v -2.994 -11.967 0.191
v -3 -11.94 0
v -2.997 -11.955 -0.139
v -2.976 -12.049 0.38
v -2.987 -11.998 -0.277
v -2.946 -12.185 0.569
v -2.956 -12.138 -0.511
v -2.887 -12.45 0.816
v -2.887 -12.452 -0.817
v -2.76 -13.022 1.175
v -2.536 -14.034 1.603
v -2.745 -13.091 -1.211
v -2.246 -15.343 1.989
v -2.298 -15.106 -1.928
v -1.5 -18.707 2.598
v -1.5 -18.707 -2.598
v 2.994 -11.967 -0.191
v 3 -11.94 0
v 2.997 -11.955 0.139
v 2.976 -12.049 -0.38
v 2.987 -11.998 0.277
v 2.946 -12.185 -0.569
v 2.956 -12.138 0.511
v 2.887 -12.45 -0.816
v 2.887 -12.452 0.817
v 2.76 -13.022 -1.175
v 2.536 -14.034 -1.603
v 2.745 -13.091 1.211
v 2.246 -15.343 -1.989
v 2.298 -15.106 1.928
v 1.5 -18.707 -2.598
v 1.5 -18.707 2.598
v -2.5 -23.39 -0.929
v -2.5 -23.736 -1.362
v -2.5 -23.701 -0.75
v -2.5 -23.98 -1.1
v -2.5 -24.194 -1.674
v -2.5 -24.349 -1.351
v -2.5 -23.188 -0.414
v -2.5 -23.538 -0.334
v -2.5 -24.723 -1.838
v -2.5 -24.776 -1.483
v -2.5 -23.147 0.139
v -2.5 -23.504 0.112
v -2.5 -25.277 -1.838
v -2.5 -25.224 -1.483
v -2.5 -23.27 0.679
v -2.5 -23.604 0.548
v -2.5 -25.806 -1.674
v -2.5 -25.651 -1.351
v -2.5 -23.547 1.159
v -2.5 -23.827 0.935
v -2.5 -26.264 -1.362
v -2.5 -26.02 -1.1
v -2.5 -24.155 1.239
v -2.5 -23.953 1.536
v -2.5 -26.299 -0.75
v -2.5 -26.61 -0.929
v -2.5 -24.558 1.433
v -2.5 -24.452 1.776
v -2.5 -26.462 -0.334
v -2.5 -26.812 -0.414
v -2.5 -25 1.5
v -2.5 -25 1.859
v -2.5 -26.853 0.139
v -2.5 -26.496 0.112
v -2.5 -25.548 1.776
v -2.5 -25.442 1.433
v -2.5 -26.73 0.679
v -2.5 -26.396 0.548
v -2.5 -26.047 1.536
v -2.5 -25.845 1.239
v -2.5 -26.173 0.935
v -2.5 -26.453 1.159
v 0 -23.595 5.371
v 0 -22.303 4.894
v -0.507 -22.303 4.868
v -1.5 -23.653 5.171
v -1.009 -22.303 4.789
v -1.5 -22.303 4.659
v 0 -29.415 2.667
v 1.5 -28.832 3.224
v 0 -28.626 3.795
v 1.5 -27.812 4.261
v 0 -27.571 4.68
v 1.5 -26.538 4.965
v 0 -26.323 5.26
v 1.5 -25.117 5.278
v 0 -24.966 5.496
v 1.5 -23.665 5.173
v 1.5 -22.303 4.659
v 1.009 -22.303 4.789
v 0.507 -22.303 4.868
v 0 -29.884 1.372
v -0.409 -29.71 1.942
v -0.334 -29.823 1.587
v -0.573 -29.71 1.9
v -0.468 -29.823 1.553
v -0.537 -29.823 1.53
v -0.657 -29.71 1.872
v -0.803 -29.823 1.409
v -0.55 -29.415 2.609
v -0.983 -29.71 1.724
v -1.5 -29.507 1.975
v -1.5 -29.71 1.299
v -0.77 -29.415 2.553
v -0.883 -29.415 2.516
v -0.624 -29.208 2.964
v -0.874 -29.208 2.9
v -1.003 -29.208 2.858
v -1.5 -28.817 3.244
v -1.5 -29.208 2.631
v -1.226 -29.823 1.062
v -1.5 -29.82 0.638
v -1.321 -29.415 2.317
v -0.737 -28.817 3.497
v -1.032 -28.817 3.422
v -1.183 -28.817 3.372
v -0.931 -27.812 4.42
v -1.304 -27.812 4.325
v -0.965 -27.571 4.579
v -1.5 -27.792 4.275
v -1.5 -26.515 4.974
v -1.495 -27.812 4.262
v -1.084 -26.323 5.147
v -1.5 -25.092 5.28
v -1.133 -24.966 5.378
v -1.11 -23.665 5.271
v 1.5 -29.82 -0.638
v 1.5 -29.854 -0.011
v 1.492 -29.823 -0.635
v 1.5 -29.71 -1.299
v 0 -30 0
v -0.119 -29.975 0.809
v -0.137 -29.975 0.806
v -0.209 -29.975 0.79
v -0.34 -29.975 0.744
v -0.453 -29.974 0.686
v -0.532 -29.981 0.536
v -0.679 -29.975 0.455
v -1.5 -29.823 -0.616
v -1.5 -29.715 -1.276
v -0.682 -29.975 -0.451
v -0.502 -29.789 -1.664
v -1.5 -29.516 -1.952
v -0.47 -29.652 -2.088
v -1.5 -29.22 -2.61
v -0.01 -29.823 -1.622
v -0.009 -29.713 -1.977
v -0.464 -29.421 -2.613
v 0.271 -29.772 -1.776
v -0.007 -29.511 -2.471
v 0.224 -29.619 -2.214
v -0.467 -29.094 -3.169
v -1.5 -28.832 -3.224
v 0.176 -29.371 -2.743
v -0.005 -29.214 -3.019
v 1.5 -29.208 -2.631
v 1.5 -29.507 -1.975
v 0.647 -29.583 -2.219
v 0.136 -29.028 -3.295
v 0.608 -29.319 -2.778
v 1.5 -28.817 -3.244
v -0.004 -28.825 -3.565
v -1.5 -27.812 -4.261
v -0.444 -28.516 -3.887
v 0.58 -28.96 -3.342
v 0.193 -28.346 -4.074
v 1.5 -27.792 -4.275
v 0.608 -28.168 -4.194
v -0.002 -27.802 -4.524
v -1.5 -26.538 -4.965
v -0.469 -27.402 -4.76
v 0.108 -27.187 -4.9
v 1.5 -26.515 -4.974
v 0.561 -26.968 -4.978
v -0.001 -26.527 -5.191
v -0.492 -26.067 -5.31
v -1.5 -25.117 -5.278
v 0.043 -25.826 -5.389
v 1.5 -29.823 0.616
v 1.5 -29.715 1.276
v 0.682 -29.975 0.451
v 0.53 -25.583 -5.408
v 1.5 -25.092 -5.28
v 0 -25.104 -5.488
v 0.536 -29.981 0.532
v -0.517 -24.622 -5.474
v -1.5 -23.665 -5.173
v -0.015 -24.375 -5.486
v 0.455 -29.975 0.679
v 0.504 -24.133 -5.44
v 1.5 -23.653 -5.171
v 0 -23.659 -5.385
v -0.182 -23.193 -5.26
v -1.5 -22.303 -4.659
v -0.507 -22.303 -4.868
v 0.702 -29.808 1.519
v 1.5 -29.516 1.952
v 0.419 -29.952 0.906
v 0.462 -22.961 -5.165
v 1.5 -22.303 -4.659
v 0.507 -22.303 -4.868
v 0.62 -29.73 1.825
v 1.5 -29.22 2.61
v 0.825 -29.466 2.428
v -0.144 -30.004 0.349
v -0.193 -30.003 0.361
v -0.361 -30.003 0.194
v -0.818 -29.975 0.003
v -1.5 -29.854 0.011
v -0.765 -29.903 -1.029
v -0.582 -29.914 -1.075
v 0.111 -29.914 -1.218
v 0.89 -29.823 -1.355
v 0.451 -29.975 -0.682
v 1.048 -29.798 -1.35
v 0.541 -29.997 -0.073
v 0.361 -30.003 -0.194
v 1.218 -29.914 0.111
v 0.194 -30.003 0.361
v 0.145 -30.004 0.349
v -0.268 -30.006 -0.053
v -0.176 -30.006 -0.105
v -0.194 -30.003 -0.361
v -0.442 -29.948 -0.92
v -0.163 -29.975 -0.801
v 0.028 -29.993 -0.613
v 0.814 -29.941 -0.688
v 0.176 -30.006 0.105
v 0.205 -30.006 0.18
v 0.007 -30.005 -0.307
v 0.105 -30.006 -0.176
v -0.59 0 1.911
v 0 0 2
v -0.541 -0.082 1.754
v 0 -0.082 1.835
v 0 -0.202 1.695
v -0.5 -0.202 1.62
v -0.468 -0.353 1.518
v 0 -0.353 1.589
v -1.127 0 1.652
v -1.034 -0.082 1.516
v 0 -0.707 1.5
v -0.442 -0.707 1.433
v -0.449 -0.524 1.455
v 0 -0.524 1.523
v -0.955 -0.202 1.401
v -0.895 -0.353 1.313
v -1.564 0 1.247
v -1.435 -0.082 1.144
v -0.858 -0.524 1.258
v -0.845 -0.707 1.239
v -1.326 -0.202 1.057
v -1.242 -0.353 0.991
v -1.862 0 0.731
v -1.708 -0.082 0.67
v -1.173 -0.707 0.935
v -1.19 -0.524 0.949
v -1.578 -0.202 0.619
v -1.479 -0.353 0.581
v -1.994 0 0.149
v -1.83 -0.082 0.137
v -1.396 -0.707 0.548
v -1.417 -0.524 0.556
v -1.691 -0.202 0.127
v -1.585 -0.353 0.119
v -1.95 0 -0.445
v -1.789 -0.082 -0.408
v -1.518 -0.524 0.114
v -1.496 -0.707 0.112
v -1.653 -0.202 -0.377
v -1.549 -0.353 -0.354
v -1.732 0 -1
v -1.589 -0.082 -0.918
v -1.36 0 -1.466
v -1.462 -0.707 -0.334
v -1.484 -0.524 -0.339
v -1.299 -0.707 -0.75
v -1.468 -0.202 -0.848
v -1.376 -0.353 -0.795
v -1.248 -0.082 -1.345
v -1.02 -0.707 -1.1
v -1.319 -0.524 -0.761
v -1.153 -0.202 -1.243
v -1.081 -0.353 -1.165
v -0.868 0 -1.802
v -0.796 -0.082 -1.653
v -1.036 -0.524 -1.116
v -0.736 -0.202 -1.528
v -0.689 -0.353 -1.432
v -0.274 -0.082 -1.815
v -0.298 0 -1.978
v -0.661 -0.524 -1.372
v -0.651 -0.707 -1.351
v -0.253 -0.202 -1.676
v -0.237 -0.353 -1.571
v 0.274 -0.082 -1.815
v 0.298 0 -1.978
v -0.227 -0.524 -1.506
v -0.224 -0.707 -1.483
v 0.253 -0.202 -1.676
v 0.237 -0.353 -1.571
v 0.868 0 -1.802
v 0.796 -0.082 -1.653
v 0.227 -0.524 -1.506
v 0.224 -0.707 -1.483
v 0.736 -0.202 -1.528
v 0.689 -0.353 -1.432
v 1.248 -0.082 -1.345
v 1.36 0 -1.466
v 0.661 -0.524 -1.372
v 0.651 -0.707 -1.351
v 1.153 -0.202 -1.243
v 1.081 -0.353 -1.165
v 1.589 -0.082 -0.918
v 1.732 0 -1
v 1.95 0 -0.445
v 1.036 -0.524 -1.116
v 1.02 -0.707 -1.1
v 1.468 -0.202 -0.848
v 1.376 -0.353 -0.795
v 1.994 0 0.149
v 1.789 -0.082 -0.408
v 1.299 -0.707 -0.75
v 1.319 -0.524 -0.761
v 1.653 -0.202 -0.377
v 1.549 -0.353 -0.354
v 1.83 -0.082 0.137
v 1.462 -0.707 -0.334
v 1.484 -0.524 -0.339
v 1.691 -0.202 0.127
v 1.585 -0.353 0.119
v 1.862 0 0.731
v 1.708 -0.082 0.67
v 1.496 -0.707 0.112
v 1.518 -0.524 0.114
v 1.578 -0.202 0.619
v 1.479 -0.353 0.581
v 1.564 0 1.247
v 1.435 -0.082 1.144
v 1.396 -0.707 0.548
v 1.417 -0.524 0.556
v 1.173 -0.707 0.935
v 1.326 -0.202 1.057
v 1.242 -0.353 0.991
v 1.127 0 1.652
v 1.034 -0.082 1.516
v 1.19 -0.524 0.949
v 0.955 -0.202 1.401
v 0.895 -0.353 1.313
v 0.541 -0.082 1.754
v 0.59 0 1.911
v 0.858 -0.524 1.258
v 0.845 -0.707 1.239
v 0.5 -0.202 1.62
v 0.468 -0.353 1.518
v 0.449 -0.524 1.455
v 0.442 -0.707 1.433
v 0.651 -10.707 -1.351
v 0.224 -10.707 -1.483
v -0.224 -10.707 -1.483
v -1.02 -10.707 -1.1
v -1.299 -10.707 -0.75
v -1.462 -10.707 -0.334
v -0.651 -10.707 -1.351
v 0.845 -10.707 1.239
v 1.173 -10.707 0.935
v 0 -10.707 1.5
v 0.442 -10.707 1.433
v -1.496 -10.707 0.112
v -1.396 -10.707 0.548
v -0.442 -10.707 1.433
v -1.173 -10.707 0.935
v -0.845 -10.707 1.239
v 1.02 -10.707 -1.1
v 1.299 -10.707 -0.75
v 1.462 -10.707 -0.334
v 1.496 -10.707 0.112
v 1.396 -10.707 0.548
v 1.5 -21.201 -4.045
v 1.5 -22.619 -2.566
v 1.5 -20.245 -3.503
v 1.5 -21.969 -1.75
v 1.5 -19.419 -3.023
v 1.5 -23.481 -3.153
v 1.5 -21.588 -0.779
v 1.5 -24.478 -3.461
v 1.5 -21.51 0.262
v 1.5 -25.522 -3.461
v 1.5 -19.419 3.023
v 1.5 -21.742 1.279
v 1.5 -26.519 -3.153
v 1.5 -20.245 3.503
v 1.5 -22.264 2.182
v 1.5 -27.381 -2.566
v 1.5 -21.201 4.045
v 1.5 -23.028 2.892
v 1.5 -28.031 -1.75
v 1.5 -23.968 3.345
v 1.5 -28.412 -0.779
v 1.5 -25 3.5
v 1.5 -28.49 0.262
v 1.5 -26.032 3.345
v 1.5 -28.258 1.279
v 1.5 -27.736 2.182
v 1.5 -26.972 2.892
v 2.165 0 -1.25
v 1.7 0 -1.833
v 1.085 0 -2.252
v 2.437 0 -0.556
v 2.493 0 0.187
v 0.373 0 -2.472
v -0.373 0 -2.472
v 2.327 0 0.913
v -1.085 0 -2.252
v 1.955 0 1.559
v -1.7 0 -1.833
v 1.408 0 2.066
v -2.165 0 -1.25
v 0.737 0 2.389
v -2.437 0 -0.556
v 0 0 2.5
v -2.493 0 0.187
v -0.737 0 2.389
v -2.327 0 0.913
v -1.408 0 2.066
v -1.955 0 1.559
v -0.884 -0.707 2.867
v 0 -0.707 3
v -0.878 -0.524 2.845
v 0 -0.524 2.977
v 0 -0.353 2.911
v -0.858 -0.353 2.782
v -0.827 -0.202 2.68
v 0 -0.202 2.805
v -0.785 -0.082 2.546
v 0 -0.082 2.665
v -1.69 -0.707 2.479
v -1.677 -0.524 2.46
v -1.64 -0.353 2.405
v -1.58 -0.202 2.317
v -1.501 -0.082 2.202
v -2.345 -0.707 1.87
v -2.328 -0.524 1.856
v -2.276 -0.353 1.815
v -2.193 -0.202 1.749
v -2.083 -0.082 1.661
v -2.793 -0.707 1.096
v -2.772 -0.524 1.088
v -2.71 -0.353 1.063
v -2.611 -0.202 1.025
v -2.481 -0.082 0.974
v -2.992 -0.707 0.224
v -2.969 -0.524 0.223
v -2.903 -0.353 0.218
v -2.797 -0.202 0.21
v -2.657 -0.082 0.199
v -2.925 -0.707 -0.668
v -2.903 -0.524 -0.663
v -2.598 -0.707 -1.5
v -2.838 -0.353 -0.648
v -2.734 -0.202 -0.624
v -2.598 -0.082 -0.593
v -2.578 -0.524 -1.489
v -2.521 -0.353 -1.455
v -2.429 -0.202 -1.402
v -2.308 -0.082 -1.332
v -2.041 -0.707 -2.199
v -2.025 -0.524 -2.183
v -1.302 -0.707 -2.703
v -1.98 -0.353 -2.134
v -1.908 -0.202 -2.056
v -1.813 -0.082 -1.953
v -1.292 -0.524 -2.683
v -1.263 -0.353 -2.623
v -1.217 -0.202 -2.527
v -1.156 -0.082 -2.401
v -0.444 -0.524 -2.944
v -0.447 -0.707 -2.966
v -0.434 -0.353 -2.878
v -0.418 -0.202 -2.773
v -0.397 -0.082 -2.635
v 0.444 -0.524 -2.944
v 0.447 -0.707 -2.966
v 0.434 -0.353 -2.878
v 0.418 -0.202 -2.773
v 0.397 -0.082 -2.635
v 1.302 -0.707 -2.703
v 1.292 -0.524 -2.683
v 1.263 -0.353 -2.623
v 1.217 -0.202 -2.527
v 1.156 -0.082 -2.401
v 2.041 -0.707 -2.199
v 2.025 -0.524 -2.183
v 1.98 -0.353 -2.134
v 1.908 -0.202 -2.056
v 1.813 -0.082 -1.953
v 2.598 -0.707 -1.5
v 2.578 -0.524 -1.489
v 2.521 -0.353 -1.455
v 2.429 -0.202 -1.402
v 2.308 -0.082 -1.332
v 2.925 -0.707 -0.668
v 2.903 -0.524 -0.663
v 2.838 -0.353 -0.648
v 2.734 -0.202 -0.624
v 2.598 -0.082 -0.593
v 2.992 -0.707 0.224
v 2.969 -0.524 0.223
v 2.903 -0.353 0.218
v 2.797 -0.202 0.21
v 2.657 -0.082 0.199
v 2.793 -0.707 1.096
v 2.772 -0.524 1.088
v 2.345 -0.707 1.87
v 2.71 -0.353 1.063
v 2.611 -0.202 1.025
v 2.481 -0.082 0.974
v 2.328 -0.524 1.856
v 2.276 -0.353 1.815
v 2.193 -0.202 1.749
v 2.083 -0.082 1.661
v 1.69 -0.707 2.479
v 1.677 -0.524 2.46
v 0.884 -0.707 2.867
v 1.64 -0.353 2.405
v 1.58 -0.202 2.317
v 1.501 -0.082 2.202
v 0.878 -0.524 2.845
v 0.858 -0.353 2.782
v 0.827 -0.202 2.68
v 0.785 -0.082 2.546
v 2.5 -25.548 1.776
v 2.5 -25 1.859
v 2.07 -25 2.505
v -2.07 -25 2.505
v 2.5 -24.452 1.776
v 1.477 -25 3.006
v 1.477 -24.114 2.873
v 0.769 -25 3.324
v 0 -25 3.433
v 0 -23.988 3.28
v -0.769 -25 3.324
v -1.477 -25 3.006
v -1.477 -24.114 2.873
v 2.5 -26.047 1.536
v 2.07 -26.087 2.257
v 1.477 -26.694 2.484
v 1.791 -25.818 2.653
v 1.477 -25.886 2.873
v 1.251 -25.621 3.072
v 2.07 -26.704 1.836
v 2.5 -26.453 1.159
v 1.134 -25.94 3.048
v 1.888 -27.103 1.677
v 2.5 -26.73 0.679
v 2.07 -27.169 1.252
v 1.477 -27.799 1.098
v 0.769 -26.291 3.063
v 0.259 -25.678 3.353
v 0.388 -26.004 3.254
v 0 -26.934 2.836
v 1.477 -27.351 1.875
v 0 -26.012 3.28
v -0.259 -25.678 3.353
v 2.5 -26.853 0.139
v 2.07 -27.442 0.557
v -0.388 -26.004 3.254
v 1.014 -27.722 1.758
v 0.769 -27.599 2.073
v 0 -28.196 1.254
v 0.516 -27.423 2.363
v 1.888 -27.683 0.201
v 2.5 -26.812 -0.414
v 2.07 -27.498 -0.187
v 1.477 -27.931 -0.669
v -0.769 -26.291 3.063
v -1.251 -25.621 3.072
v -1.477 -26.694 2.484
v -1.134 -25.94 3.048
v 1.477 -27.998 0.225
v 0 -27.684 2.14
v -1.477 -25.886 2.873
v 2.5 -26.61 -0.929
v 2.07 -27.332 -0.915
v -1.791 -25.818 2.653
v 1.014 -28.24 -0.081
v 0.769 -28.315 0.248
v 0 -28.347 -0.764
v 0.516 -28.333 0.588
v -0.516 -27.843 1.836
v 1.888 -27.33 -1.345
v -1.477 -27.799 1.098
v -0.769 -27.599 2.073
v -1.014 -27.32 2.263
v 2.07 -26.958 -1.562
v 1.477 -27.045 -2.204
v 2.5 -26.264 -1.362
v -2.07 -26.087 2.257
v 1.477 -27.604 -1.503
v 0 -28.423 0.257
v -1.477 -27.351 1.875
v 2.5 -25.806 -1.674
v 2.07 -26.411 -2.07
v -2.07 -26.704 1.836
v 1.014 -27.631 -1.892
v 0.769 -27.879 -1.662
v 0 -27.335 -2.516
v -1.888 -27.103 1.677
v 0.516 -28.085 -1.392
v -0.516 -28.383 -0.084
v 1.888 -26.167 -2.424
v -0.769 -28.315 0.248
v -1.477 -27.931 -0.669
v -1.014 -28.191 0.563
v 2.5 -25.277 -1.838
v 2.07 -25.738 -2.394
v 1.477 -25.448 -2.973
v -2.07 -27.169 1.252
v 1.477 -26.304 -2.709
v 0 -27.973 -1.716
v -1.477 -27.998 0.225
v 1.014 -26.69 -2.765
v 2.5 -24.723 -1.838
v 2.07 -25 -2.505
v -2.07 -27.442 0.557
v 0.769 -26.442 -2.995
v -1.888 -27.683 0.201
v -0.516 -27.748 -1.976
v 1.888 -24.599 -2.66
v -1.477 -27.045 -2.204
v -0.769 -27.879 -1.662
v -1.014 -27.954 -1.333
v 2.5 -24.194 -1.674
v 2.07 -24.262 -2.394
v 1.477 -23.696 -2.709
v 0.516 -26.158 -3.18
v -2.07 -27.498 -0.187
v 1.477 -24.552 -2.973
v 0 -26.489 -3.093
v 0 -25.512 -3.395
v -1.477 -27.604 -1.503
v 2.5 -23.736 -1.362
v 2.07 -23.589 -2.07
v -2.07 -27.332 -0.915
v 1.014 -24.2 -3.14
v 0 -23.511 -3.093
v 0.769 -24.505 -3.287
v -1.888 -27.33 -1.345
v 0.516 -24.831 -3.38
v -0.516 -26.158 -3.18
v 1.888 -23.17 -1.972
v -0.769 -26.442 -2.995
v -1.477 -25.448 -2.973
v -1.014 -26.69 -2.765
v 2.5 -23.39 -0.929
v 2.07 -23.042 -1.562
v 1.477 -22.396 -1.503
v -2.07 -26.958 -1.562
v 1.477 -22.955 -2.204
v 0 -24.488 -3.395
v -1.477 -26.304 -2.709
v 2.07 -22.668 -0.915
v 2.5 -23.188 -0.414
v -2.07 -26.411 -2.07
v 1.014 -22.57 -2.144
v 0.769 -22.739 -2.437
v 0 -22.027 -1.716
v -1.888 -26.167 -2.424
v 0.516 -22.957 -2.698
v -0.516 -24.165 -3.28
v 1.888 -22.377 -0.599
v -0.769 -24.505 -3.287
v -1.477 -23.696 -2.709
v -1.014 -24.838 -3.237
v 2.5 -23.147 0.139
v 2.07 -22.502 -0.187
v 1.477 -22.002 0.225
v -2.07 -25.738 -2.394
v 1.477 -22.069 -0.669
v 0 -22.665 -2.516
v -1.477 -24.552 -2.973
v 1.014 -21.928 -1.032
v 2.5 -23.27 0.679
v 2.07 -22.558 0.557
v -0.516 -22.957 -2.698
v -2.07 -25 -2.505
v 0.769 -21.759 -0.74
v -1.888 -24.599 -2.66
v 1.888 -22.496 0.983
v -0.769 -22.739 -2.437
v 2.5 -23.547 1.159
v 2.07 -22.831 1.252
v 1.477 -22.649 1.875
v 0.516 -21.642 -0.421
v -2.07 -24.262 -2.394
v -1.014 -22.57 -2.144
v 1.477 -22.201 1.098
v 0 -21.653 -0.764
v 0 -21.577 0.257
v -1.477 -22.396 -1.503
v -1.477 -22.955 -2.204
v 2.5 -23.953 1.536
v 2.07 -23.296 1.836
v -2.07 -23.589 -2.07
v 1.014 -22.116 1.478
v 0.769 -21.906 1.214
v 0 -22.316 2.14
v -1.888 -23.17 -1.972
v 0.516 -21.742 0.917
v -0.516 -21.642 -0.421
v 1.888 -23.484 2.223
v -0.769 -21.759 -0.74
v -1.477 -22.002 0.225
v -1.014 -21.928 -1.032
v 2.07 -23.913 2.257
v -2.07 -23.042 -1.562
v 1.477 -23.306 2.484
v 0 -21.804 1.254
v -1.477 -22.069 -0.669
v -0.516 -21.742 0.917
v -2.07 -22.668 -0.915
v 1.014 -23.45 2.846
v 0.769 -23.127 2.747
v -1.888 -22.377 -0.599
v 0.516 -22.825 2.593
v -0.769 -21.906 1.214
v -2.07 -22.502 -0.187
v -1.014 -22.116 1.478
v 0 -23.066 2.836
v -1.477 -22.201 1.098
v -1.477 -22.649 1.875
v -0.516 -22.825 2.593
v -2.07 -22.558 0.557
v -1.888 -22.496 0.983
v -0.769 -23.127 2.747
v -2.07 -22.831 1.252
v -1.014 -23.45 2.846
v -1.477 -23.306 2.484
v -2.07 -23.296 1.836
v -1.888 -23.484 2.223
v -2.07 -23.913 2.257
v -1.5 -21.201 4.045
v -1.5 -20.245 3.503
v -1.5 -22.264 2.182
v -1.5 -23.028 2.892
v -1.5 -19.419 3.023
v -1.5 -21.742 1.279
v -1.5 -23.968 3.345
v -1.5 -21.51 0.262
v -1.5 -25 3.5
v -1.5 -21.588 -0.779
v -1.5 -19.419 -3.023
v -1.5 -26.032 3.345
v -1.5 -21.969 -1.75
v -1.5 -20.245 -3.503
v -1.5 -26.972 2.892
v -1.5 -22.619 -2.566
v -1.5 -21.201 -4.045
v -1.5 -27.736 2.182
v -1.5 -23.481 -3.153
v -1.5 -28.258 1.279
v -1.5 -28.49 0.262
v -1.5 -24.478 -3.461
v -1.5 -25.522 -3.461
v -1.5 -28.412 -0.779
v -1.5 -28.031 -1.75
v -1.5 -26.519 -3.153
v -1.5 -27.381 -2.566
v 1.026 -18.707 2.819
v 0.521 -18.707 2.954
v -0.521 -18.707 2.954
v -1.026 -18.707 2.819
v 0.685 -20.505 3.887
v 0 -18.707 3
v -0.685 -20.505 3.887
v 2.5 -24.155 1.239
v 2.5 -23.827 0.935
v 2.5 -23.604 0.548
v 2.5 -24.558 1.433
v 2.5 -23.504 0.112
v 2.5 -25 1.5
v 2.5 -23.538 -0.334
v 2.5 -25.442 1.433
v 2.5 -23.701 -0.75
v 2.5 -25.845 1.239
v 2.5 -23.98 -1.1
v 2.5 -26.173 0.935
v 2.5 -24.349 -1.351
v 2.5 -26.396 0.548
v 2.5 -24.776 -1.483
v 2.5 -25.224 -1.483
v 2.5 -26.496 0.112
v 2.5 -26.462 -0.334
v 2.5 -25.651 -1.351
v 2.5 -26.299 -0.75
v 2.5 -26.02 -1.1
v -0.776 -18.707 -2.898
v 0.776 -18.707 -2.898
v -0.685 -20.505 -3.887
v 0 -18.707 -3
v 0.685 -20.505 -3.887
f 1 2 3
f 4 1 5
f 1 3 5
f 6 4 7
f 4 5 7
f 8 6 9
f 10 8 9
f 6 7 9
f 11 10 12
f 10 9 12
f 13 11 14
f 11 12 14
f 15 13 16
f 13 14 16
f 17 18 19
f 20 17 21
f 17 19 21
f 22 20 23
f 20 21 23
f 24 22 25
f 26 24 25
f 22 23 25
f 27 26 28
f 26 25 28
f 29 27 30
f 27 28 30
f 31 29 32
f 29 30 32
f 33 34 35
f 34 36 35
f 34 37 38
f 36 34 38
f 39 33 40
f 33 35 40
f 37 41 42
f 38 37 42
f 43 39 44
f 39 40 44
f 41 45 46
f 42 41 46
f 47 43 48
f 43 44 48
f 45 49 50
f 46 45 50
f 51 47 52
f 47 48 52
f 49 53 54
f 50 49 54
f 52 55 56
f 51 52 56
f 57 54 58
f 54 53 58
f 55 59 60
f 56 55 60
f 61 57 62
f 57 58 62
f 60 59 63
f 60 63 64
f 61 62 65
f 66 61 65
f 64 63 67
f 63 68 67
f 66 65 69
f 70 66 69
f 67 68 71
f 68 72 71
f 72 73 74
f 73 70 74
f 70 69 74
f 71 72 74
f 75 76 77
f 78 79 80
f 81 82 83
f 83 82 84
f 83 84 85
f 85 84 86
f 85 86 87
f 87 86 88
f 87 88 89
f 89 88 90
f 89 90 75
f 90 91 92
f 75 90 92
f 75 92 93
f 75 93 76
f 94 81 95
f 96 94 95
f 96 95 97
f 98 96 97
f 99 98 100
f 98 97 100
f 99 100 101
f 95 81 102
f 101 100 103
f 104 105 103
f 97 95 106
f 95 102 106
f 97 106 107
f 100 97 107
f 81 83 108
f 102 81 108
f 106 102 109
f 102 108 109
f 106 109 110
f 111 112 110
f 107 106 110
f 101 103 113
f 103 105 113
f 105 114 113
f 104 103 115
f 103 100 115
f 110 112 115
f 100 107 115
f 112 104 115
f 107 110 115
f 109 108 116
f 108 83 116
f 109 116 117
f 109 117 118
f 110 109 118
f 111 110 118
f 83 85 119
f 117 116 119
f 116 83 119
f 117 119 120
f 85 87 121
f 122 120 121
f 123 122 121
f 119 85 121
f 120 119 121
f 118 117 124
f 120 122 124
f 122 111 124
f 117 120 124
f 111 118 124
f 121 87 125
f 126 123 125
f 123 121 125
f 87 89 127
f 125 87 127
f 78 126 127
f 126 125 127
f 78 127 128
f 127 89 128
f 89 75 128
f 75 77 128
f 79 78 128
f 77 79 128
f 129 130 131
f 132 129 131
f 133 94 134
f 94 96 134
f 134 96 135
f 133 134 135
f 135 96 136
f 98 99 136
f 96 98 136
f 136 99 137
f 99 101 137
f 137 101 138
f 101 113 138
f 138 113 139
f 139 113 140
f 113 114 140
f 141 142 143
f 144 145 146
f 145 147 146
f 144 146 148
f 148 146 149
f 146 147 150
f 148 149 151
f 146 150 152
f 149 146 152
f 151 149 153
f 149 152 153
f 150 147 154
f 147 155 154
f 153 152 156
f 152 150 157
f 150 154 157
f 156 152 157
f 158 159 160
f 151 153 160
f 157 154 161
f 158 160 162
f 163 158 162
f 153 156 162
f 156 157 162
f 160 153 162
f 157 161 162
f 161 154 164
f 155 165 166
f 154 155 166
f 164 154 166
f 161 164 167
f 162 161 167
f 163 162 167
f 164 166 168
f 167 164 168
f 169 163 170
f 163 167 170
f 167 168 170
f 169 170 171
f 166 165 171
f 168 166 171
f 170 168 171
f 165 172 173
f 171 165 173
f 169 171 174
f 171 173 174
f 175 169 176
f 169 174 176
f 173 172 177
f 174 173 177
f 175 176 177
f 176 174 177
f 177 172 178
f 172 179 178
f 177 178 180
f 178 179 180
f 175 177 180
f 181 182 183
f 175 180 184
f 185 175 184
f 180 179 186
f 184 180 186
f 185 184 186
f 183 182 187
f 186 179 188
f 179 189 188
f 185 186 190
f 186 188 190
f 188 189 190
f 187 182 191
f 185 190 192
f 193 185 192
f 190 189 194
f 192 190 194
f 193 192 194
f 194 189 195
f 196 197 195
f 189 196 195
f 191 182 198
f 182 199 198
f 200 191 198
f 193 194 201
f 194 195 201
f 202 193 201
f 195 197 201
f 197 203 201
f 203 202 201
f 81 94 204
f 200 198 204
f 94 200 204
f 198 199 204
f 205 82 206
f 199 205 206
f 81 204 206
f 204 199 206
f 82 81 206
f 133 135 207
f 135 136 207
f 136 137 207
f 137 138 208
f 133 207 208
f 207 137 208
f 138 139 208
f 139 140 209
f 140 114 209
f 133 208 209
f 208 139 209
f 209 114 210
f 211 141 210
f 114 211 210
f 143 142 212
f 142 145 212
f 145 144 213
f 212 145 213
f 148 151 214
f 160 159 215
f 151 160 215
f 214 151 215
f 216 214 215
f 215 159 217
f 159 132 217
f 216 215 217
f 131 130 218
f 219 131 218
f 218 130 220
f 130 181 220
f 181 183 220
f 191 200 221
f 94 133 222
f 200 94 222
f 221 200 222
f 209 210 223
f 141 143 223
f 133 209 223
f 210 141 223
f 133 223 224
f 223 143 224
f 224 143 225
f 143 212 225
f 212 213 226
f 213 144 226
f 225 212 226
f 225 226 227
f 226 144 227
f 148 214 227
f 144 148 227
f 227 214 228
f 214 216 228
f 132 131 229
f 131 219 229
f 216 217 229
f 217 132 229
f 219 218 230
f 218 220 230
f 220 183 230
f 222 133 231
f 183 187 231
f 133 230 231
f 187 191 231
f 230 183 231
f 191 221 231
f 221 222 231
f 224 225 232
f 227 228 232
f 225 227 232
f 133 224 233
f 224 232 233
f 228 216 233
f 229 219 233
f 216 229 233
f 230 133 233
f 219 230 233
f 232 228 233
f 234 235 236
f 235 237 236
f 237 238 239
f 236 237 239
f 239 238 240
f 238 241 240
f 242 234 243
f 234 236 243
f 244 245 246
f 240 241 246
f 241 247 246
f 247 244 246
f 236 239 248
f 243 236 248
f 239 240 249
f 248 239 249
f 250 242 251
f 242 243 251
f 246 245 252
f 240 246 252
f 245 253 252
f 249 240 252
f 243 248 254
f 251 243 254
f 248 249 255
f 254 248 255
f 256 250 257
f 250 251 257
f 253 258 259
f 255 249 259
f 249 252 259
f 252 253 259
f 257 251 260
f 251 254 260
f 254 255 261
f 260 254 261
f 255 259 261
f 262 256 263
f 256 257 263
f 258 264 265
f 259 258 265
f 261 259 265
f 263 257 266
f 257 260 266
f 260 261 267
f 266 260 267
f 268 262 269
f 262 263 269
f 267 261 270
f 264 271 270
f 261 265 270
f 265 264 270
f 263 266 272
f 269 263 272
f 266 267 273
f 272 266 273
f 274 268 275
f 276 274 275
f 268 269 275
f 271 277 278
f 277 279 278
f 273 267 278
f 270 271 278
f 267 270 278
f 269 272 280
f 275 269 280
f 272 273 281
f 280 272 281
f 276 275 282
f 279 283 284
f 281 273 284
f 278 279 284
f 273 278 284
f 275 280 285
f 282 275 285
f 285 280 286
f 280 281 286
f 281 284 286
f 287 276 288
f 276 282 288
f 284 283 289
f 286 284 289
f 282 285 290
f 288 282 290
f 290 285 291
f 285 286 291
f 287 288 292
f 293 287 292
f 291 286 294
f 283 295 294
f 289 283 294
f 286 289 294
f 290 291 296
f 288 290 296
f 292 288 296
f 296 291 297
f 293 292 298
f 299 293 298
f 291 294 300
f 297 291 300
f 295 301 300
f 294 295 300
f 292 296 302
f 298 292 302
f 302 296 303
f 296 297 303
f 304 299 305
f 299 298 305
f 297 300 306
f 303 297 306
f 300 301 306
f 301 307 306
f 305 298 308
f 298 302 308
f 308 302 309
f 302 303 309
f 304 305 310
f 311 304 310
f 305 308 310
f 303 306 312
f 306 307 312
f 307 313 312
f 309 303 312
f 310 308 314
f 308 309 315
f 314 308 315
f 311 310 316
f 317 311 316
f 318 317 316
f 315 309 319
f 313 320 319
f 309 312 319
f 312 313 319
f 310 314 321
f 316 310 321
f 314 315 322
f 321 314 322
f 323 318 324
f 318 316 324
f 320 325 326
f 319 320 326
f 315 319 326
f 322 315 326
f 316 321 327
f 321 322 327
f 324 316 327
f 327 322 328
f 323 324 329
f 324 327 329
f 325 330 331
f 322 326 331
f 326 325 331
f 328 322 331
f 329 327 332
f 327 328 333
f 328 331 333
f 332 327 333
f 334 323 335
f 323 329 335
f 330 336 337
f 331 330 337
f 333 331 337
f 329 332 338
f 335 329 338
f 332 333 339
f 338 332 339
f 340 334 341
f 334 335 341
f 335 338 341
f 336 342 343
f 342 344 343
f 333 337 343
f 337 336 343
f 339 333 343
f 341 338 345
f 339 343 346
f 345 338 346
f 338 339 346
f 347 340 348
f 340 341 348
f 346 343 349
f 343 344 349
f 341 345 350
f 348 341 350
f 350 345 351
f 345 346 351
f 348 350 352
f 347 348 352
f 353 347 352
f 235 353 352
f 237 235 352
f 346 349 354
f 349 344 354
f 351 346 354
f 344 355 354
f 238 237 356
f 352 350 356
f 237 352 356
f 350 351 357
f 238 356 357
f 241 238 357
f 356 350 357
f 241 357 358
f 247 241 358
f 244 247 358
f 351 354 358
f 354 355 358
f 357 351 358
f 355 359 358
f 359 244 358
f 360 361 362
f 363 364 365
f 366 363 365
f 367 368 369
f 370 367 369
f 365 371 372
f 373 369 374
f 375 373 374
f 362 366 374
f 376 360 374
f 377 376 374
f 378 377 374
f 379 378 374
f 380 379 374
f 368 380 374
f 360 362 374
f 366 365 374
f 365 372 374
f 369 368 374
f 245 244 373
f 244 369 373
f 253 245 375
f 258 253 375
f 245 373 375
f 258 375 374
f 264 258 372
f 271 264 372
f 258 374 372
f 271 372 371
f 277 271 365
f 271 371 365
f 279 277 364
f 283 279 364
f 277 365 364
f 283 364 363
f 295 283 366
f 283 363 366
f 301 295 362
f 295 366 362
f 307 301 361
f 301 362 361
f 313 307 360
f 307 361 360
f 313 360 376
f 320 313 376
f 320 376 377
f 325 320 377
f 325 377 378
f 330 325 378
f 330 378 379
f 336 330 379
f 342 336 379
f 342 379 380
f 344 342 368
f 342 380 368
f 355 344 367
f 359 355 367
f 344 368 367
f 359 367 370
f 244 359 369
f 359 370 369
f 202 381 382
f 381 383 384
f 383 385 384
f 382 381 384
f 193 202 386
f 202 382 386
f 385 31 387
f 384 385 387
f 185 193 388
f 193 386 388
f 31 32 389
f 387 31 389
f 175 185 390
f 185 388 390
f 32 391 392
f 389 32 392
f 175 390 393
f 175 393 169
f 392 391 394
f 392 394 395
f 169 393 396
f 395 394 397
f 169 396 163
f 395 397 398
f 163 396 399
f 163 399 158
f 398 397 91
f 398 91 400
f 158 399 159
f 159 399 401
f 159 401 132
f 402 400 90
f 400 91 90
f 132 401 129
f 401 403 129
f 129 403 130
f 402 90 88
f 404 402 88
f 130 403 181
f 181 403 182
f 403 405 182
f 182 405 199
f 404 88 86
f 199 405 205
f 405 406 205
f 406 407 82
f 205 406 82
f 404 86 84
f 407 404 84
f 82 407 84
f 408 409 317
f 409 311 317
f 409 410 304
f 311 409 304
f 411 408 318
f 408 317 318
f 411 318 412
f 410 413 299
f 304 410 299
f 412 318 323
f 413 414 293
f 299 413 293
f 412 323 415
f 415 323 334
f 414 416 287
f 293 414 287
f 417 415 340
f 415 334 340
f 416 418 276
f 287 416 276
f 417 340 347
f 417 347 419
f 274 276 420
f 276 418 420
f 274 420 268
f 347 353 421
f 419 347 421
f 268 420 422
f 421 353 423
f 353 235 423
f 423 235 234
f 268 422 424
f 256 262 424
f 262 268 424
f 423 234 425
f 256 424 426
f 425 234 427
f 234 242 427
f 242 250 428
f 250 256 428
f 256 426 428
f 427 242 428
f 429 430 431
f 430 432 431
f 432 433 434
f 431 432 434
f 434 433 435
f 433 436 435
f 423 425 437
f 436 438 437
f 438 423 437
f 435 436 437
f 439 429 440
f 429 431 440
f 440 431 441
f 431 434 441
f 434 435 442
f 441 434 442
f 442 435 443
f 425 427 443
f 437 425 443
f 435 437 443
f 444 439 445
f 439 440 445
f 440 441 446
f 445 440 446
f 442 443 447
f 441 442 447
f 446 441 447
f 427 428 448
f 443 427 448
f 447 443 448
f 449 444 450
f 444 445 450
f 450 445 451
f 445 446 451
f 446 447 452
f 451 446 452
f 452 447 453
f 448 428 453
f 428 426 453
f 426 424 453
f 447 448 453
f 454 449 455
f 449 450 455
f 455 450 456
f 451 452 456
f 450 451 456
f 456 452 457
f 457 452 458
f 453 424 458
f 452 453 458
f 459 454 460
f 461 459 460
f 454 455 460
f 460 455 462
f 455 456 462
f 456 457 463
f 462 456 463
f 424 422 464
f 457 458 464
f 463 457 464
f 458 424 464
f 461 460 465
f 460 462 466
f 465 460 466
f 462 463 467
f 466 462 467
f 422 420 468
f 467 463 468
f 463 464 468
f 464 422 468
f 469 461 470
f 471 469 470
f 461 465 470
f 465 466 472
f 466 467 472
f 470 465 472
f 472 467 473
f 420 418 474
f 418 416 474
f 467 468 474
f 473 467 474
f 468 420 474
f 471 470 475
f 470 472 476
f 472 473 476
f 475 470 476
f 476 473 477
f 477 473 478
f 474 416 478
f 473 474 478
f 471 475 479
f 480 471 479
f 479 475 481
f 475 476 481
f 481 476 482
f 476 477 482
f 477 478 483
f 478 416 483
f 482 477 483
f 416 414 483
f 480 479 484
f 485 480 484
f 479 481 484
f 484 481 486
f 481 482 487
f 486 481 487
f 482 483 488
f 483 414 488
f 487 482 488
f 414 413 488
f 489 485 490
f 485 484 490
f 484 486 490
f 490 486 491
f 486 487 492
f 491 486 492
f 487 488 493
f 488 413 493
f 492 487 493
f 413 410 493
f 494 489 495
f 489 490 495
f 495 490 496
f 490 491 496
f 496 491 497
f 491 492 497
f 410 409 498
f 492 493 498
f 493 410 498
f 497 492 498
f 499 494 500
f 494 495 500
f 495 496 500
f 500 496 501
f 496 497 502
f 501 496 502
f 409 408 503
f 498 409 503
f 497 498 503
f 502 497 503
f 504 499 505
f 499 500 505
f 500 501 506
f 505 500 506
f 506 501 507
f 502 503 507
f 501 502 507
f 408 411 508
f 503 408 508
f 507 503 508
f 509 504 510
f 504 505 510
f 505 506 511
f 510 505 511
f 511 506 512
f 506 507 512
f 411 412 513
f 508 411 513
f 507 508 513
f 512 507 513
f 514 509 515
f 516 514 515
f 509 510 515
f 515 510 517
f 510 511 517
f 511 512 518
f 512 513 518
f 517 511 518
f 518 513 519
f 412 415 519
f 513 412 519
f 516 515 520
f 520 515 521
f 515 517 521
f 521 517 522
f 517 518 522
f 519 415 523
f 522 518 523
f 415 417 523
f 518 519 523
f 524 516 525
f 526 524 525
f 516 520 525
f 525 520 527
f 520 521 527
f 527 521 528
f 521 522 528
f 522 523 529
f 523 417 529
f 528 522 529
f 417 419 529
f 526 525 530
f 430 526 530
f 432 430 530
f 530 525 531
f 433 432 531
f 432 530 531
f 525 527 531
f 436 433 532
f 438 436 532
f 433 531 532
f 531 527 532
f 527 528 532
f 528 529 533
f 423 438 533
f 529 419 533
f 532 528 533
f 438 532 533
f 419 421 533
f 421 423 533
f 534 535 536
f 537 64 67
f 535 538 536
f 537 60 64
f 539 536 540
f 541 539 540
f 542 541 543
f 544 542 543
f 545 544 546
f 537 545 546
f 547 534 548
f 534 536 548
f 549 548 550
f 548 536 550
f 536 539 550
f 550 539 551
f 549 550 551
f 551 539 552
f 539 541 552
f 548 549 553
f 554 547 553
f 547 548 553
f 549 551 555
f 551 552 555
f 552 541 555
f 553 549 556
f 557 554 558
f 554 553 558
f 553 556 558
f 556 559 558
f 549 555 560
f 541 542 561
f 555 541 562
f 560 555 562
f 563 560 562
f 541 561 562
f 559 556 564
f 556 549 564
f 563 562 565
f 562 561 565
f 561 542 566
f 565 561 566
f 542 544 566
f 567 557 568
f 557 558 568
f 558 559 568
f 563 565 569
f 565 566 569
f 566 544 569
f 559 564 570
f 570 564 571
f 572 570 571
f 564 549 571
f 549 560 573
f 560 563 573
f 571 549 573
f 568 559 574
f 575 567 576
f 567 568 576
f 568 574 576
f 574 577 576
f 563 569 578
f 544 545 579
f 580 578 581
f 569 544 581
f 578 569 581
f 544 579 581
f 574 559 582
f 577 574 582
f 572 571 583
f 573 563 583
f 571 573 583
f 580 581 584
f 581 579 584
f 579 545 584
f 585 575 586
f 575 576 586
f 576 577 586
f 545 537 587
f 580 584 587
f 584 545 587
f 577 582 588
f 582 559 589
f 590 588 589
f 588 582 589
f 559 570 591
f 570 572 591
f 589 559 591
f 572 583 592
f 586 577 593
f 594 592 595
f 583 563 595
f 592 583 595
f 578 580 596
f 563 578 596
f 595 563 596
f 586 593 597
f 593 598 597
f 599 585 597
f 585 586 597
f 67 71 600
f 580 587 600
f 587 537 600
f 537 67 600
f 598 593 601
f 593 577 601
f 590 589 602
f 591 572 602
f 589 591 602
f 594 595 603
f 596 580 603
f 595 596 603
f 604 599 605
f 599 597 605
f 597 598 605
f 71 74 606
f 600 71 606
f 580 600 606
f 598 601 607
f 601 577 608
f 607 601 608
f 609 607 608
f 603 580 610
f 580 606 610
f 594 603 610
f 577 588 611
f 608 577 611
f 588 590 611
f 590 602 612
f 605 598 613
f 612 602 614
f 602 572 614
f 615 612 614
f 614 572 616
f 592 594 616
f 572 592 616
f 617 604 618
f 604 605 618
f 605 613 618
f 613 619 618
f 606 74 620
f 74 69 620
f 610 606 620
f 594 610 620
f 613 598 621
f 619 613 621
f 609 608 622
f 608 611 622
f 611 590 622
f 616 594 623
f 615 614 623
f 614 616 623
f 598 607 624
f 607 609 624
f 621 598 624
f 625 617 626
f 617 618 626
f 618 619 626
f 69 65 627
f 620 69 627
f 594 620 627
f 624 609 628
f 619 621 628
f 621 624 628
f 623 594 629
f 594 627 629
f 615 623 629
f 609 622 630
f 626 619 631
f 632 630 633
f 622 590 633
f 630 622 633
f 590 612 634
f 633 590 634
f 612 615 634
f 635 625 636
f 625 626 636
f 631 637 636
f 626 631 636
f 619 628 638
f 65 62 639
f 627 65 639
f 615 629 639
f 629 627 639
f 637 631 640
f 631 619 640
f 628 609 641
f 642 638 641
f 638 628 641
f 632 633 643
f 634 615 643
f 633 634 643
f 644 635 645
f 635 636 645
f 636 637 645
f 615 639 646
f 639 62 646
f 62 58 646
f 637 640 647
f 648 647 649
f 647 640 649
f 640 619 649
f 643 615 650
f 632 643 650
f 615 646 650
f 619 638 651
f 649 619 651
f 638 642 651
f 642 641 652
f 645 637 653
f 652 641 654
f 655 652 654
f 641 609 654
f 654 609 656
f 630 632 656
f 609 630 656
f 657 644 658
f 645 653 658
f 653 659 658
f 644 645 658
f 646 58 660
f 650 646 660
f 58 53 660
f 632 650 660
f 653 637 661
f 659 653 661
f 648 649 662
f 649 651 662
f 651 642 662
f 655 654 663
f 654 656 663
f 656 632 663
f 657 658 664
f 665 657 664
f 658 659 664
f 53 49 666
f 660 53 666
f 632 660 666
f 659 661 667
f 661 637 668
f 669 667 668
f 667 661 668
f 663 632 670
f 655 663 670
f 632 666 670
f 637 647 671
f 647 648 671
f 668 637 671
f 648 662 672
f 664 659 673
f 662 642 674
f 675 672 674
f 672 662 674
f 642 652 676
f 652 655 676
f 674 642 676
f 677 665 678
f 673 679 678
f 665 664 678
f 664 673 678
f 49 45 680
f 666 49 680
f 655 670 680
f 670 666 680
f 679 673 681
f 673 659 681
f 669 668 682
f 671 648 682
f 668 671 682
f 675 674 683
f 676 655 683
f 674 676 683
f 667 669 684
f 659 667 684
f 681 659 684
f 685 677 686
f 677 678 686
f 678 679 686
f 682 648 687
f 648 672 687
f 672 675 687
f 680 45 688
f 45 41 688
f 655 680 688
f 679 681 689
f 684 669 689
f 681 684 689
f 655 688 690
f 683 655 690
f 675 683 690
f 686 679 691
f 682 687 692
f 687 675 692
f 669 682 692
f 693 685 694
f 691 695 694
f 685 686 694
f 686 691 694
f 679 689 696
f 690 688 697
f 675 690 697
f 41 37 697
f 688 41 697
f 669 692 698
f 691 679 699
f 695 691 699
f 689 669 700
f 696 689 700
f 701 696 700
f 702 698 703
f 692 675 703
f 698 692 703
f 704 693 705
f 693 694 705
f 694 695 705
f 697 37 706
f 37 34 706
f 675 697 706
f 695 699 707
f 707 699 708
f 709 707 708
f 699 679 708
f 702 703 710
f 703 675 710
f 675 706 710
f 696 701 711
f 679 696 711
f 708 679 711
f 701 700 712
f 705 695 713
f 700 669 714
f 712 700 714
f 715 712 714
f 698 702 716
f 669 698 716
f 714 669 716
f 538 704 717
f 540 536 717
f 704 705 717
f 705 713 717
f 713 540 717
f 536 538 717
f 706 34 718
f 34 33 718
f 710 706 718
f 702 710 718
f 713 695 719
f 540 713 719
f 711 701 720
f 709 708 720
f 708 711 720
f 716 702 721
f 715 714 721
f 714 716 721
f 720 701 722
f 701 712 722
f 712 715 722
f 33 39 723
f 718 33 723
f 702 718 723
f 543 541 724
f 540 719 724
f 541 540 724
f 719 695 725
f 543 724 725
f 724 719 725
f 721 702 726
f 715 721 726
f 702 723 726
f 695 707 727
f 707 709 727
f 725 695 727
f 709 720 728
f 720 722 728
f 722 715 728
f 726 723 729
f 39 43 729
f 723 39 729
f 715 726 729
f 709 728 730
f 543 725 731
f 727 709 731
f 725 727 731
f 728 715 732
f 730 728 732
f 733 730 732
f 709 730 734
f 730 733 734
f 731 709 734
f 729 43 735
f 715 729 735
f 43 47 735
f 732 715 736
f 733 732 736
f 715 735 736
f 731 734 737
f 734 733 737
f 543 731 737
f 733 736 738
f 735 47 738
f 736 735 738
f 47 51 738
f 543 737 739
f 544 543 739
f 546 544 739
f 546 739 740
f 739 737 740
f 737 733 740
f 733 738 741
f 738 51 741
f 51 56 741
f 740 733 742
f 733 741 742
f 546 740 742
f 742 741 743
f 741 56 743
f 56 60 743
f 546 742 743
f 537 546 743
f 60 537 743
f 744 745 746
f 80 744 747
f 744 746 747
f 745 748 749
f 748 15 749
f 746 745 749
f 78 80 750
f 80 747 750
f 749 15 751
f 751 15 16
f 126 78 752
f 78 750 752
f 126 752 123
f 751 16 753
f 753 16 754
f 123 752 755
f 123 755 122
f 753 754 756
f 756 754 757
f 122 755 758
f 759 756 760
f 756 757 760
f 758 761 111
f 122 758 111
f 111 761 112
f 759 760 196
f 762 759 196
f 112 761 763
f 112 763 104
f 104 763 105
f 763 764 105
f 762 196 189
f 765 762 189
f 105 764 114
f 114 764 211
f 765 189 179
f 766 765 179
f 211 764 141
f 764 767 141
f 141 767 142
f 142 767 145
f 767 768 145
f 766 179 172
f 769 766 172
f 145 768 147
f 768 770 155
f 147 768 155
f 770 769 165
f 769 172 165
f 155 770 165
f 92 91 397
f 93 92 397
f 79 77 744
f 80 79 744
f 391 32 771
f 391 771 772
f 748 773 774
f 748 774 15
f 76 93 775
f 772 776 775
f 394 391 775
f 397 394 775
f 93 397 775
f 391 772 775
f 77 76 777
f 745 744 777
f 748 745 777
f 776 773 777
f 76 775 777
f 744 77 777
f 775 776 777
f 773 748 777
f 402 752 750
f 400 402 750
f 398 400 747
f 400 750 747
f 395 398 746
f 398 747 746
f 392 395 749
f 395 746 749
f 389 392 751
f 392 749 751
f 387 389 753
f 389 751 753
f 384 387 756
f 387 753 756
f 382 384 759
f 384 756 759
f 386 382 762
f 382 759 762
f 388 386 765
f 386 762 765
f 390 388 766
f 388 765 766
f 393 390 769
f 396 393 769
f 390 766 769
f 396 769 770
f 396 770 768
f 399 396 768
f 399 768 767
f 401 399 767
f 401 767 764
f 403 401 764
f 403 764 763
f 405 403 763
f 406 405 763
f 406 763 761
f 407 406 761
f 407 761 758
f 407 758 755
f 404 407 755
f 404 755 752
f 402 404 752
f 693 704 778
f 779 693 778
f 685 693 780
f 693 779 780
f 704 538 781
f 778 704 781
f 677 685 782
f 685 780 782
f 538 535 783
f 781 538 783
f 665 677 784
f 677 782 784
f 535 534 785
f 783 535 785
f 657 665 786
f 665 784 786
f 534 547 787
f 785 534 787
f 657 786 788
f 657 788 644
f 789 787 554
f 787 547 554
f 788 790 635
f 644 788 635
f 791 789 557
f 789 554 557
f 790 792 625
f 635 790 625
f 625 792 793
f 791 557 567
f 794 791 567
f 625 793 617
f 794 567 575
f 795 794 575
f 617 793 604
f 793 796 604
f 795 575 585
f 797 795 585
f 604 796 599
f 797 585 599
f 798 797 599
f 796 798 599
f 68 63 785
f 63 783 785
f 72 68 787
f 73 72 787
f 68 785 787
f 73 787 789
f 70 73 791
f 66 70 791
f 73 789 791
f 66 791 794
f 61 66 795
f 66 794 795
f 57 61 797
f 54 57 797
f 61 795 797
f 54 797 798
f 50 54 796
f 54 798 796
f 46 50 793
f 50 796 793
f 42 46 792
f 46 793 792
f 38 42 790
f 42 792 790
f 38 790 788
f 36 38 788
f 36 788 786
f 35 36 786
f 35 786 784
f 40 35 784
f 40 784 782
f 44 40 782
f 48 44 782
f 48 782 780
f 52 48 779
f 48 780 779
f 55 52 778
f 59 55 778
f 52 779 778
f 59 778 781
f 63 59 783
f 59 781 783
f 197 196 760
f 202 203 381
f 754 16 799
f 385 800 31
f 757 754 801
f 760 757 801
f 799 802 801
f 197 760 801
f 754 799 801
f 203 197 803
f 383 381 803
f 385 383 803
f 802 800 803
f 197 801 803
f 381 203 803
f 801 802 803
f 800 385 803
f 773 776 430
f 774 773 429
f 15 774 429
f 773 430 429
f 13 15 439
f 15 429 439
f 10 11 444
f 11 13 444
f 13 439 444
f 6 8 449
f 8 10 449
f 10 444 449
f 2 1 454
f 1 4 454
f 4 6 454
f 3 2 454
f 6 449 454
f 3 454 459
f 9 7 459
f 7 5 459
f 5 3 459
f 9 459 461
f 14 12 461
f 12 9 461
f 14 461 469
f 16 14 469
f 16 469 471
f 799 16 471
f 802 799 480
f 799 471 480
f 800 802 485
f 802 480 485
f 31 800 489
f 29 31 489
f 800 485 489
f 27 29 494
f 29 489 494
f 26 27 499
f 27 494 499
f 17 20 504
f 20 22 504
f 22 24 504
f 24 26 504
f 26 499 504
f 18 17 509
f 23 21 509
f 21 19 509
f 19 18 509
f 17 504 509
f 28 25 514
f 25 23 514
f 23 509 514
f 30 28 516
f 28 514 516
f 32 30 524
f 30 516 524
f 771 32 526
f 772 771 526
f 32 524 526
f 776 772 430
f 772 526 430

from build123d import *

# Parameters (mm, degrees)
CUT_EXTRUDE_1_DEPTH = 8
SKETCH_6_R          = 3.5
CUT_EXTRUDE_2_DEPTH = 16


with BuildPart() as part:
    # 草图1 → 旋转1 (revolve)
    with BuildSketch(Plane(origin=(0, 0, 0), x_dir=(0, 0, -1), z_dir=(1, 0, 0)), mode=Mode.PRIVATE) as revolve_1_sk:
        with BuildLine():
            Line((1.5, -0.707106781), (1.5, -10.707106781))
            Line((1.5, -10.707106781), (0, -10.707106781))
            Line((0, -10.707106781), (0, -30))
            ThreePointArc((0, -30), (4.679543251, -27.571142528), (4.894439657, -22.303192909))
            Line((4.894439657, -22.303192909), (3, -18.707106781))
            Line((3, -18.707106781), (3, -0.707106781))
            ThreePointArc((3, -0.707106781), (2.862372436, -0.274094079), (2.5, 0))
            Line((2.5, 0), (2, 0))
            ThreePointArc((2, 0), (1.637627564, -0.274094079), (1.5, -0.707106781))
        make_face()
    revolve(revolve_1_sk.sketch.rotate(Axis((0, 0, 0), (0, -1, 0)), 180), axis=Axis((0, 0, 0), (0, -1, 0)))

    # 草图5 → 切除-拉伸1 (cut, symmetric)
    with BuildSketch(Plane.XY):
        Polygon((-3, -11.940068736), (-1.5, -18.707106781), (-1.5, -33.687939327), (-8.726948797, -33.687939327), (-8.726948797, -11.940068736), align=None)
        Polygon((3, -11.940068736), (1.5, -18.707106781), (1.5, -33.687939327), (8.726948797, -33.687939327), (8.726948797, -11.940068736), align=None)
    extrude(amount=CUT_EXTRUDE_1_DEPTH, both=True, mode=Mode.SUBTRACT)

    # 草图6 → 切除-拉伸2 (cut)
    with BuildSketch(Plane.ZY.offset(1.5)):
        with Locations((0, -25)):
            Circle(SKETCH_6_R)
    extrude(amount=-CUT_EXTRUDE_2_DEPTH, mode=Mode.SUBTRACT)


with BuildPart() as body_2:
    # 草图7 → 旋转3 (revolve)
    with BuildSketch(Plane.XY, mode=Mode.PRIVATE) as revolve_3_sk:
        with BuildLine():
            Line((-2.5, -26.5), (2.5, -26.5))
            Line((2.5, -26.5), (2.5, -26.858504456))
            ThreePointArc((2.5, -26.858504456), (0, -28.432857223), (-2.5, -26.858504456))
            Line((-2.5, -26.858504456), (-2.5, -26.5))
        make_face()
    revolve(revolve_3_sk.sketch.rotate(Axis((-1.5, -25, 0), (1, 0, 0)), 270), axis=Axis((-1.5, -25, 0), (1, 0, 0)))


solid = Compound([part.part, body_2.part])
